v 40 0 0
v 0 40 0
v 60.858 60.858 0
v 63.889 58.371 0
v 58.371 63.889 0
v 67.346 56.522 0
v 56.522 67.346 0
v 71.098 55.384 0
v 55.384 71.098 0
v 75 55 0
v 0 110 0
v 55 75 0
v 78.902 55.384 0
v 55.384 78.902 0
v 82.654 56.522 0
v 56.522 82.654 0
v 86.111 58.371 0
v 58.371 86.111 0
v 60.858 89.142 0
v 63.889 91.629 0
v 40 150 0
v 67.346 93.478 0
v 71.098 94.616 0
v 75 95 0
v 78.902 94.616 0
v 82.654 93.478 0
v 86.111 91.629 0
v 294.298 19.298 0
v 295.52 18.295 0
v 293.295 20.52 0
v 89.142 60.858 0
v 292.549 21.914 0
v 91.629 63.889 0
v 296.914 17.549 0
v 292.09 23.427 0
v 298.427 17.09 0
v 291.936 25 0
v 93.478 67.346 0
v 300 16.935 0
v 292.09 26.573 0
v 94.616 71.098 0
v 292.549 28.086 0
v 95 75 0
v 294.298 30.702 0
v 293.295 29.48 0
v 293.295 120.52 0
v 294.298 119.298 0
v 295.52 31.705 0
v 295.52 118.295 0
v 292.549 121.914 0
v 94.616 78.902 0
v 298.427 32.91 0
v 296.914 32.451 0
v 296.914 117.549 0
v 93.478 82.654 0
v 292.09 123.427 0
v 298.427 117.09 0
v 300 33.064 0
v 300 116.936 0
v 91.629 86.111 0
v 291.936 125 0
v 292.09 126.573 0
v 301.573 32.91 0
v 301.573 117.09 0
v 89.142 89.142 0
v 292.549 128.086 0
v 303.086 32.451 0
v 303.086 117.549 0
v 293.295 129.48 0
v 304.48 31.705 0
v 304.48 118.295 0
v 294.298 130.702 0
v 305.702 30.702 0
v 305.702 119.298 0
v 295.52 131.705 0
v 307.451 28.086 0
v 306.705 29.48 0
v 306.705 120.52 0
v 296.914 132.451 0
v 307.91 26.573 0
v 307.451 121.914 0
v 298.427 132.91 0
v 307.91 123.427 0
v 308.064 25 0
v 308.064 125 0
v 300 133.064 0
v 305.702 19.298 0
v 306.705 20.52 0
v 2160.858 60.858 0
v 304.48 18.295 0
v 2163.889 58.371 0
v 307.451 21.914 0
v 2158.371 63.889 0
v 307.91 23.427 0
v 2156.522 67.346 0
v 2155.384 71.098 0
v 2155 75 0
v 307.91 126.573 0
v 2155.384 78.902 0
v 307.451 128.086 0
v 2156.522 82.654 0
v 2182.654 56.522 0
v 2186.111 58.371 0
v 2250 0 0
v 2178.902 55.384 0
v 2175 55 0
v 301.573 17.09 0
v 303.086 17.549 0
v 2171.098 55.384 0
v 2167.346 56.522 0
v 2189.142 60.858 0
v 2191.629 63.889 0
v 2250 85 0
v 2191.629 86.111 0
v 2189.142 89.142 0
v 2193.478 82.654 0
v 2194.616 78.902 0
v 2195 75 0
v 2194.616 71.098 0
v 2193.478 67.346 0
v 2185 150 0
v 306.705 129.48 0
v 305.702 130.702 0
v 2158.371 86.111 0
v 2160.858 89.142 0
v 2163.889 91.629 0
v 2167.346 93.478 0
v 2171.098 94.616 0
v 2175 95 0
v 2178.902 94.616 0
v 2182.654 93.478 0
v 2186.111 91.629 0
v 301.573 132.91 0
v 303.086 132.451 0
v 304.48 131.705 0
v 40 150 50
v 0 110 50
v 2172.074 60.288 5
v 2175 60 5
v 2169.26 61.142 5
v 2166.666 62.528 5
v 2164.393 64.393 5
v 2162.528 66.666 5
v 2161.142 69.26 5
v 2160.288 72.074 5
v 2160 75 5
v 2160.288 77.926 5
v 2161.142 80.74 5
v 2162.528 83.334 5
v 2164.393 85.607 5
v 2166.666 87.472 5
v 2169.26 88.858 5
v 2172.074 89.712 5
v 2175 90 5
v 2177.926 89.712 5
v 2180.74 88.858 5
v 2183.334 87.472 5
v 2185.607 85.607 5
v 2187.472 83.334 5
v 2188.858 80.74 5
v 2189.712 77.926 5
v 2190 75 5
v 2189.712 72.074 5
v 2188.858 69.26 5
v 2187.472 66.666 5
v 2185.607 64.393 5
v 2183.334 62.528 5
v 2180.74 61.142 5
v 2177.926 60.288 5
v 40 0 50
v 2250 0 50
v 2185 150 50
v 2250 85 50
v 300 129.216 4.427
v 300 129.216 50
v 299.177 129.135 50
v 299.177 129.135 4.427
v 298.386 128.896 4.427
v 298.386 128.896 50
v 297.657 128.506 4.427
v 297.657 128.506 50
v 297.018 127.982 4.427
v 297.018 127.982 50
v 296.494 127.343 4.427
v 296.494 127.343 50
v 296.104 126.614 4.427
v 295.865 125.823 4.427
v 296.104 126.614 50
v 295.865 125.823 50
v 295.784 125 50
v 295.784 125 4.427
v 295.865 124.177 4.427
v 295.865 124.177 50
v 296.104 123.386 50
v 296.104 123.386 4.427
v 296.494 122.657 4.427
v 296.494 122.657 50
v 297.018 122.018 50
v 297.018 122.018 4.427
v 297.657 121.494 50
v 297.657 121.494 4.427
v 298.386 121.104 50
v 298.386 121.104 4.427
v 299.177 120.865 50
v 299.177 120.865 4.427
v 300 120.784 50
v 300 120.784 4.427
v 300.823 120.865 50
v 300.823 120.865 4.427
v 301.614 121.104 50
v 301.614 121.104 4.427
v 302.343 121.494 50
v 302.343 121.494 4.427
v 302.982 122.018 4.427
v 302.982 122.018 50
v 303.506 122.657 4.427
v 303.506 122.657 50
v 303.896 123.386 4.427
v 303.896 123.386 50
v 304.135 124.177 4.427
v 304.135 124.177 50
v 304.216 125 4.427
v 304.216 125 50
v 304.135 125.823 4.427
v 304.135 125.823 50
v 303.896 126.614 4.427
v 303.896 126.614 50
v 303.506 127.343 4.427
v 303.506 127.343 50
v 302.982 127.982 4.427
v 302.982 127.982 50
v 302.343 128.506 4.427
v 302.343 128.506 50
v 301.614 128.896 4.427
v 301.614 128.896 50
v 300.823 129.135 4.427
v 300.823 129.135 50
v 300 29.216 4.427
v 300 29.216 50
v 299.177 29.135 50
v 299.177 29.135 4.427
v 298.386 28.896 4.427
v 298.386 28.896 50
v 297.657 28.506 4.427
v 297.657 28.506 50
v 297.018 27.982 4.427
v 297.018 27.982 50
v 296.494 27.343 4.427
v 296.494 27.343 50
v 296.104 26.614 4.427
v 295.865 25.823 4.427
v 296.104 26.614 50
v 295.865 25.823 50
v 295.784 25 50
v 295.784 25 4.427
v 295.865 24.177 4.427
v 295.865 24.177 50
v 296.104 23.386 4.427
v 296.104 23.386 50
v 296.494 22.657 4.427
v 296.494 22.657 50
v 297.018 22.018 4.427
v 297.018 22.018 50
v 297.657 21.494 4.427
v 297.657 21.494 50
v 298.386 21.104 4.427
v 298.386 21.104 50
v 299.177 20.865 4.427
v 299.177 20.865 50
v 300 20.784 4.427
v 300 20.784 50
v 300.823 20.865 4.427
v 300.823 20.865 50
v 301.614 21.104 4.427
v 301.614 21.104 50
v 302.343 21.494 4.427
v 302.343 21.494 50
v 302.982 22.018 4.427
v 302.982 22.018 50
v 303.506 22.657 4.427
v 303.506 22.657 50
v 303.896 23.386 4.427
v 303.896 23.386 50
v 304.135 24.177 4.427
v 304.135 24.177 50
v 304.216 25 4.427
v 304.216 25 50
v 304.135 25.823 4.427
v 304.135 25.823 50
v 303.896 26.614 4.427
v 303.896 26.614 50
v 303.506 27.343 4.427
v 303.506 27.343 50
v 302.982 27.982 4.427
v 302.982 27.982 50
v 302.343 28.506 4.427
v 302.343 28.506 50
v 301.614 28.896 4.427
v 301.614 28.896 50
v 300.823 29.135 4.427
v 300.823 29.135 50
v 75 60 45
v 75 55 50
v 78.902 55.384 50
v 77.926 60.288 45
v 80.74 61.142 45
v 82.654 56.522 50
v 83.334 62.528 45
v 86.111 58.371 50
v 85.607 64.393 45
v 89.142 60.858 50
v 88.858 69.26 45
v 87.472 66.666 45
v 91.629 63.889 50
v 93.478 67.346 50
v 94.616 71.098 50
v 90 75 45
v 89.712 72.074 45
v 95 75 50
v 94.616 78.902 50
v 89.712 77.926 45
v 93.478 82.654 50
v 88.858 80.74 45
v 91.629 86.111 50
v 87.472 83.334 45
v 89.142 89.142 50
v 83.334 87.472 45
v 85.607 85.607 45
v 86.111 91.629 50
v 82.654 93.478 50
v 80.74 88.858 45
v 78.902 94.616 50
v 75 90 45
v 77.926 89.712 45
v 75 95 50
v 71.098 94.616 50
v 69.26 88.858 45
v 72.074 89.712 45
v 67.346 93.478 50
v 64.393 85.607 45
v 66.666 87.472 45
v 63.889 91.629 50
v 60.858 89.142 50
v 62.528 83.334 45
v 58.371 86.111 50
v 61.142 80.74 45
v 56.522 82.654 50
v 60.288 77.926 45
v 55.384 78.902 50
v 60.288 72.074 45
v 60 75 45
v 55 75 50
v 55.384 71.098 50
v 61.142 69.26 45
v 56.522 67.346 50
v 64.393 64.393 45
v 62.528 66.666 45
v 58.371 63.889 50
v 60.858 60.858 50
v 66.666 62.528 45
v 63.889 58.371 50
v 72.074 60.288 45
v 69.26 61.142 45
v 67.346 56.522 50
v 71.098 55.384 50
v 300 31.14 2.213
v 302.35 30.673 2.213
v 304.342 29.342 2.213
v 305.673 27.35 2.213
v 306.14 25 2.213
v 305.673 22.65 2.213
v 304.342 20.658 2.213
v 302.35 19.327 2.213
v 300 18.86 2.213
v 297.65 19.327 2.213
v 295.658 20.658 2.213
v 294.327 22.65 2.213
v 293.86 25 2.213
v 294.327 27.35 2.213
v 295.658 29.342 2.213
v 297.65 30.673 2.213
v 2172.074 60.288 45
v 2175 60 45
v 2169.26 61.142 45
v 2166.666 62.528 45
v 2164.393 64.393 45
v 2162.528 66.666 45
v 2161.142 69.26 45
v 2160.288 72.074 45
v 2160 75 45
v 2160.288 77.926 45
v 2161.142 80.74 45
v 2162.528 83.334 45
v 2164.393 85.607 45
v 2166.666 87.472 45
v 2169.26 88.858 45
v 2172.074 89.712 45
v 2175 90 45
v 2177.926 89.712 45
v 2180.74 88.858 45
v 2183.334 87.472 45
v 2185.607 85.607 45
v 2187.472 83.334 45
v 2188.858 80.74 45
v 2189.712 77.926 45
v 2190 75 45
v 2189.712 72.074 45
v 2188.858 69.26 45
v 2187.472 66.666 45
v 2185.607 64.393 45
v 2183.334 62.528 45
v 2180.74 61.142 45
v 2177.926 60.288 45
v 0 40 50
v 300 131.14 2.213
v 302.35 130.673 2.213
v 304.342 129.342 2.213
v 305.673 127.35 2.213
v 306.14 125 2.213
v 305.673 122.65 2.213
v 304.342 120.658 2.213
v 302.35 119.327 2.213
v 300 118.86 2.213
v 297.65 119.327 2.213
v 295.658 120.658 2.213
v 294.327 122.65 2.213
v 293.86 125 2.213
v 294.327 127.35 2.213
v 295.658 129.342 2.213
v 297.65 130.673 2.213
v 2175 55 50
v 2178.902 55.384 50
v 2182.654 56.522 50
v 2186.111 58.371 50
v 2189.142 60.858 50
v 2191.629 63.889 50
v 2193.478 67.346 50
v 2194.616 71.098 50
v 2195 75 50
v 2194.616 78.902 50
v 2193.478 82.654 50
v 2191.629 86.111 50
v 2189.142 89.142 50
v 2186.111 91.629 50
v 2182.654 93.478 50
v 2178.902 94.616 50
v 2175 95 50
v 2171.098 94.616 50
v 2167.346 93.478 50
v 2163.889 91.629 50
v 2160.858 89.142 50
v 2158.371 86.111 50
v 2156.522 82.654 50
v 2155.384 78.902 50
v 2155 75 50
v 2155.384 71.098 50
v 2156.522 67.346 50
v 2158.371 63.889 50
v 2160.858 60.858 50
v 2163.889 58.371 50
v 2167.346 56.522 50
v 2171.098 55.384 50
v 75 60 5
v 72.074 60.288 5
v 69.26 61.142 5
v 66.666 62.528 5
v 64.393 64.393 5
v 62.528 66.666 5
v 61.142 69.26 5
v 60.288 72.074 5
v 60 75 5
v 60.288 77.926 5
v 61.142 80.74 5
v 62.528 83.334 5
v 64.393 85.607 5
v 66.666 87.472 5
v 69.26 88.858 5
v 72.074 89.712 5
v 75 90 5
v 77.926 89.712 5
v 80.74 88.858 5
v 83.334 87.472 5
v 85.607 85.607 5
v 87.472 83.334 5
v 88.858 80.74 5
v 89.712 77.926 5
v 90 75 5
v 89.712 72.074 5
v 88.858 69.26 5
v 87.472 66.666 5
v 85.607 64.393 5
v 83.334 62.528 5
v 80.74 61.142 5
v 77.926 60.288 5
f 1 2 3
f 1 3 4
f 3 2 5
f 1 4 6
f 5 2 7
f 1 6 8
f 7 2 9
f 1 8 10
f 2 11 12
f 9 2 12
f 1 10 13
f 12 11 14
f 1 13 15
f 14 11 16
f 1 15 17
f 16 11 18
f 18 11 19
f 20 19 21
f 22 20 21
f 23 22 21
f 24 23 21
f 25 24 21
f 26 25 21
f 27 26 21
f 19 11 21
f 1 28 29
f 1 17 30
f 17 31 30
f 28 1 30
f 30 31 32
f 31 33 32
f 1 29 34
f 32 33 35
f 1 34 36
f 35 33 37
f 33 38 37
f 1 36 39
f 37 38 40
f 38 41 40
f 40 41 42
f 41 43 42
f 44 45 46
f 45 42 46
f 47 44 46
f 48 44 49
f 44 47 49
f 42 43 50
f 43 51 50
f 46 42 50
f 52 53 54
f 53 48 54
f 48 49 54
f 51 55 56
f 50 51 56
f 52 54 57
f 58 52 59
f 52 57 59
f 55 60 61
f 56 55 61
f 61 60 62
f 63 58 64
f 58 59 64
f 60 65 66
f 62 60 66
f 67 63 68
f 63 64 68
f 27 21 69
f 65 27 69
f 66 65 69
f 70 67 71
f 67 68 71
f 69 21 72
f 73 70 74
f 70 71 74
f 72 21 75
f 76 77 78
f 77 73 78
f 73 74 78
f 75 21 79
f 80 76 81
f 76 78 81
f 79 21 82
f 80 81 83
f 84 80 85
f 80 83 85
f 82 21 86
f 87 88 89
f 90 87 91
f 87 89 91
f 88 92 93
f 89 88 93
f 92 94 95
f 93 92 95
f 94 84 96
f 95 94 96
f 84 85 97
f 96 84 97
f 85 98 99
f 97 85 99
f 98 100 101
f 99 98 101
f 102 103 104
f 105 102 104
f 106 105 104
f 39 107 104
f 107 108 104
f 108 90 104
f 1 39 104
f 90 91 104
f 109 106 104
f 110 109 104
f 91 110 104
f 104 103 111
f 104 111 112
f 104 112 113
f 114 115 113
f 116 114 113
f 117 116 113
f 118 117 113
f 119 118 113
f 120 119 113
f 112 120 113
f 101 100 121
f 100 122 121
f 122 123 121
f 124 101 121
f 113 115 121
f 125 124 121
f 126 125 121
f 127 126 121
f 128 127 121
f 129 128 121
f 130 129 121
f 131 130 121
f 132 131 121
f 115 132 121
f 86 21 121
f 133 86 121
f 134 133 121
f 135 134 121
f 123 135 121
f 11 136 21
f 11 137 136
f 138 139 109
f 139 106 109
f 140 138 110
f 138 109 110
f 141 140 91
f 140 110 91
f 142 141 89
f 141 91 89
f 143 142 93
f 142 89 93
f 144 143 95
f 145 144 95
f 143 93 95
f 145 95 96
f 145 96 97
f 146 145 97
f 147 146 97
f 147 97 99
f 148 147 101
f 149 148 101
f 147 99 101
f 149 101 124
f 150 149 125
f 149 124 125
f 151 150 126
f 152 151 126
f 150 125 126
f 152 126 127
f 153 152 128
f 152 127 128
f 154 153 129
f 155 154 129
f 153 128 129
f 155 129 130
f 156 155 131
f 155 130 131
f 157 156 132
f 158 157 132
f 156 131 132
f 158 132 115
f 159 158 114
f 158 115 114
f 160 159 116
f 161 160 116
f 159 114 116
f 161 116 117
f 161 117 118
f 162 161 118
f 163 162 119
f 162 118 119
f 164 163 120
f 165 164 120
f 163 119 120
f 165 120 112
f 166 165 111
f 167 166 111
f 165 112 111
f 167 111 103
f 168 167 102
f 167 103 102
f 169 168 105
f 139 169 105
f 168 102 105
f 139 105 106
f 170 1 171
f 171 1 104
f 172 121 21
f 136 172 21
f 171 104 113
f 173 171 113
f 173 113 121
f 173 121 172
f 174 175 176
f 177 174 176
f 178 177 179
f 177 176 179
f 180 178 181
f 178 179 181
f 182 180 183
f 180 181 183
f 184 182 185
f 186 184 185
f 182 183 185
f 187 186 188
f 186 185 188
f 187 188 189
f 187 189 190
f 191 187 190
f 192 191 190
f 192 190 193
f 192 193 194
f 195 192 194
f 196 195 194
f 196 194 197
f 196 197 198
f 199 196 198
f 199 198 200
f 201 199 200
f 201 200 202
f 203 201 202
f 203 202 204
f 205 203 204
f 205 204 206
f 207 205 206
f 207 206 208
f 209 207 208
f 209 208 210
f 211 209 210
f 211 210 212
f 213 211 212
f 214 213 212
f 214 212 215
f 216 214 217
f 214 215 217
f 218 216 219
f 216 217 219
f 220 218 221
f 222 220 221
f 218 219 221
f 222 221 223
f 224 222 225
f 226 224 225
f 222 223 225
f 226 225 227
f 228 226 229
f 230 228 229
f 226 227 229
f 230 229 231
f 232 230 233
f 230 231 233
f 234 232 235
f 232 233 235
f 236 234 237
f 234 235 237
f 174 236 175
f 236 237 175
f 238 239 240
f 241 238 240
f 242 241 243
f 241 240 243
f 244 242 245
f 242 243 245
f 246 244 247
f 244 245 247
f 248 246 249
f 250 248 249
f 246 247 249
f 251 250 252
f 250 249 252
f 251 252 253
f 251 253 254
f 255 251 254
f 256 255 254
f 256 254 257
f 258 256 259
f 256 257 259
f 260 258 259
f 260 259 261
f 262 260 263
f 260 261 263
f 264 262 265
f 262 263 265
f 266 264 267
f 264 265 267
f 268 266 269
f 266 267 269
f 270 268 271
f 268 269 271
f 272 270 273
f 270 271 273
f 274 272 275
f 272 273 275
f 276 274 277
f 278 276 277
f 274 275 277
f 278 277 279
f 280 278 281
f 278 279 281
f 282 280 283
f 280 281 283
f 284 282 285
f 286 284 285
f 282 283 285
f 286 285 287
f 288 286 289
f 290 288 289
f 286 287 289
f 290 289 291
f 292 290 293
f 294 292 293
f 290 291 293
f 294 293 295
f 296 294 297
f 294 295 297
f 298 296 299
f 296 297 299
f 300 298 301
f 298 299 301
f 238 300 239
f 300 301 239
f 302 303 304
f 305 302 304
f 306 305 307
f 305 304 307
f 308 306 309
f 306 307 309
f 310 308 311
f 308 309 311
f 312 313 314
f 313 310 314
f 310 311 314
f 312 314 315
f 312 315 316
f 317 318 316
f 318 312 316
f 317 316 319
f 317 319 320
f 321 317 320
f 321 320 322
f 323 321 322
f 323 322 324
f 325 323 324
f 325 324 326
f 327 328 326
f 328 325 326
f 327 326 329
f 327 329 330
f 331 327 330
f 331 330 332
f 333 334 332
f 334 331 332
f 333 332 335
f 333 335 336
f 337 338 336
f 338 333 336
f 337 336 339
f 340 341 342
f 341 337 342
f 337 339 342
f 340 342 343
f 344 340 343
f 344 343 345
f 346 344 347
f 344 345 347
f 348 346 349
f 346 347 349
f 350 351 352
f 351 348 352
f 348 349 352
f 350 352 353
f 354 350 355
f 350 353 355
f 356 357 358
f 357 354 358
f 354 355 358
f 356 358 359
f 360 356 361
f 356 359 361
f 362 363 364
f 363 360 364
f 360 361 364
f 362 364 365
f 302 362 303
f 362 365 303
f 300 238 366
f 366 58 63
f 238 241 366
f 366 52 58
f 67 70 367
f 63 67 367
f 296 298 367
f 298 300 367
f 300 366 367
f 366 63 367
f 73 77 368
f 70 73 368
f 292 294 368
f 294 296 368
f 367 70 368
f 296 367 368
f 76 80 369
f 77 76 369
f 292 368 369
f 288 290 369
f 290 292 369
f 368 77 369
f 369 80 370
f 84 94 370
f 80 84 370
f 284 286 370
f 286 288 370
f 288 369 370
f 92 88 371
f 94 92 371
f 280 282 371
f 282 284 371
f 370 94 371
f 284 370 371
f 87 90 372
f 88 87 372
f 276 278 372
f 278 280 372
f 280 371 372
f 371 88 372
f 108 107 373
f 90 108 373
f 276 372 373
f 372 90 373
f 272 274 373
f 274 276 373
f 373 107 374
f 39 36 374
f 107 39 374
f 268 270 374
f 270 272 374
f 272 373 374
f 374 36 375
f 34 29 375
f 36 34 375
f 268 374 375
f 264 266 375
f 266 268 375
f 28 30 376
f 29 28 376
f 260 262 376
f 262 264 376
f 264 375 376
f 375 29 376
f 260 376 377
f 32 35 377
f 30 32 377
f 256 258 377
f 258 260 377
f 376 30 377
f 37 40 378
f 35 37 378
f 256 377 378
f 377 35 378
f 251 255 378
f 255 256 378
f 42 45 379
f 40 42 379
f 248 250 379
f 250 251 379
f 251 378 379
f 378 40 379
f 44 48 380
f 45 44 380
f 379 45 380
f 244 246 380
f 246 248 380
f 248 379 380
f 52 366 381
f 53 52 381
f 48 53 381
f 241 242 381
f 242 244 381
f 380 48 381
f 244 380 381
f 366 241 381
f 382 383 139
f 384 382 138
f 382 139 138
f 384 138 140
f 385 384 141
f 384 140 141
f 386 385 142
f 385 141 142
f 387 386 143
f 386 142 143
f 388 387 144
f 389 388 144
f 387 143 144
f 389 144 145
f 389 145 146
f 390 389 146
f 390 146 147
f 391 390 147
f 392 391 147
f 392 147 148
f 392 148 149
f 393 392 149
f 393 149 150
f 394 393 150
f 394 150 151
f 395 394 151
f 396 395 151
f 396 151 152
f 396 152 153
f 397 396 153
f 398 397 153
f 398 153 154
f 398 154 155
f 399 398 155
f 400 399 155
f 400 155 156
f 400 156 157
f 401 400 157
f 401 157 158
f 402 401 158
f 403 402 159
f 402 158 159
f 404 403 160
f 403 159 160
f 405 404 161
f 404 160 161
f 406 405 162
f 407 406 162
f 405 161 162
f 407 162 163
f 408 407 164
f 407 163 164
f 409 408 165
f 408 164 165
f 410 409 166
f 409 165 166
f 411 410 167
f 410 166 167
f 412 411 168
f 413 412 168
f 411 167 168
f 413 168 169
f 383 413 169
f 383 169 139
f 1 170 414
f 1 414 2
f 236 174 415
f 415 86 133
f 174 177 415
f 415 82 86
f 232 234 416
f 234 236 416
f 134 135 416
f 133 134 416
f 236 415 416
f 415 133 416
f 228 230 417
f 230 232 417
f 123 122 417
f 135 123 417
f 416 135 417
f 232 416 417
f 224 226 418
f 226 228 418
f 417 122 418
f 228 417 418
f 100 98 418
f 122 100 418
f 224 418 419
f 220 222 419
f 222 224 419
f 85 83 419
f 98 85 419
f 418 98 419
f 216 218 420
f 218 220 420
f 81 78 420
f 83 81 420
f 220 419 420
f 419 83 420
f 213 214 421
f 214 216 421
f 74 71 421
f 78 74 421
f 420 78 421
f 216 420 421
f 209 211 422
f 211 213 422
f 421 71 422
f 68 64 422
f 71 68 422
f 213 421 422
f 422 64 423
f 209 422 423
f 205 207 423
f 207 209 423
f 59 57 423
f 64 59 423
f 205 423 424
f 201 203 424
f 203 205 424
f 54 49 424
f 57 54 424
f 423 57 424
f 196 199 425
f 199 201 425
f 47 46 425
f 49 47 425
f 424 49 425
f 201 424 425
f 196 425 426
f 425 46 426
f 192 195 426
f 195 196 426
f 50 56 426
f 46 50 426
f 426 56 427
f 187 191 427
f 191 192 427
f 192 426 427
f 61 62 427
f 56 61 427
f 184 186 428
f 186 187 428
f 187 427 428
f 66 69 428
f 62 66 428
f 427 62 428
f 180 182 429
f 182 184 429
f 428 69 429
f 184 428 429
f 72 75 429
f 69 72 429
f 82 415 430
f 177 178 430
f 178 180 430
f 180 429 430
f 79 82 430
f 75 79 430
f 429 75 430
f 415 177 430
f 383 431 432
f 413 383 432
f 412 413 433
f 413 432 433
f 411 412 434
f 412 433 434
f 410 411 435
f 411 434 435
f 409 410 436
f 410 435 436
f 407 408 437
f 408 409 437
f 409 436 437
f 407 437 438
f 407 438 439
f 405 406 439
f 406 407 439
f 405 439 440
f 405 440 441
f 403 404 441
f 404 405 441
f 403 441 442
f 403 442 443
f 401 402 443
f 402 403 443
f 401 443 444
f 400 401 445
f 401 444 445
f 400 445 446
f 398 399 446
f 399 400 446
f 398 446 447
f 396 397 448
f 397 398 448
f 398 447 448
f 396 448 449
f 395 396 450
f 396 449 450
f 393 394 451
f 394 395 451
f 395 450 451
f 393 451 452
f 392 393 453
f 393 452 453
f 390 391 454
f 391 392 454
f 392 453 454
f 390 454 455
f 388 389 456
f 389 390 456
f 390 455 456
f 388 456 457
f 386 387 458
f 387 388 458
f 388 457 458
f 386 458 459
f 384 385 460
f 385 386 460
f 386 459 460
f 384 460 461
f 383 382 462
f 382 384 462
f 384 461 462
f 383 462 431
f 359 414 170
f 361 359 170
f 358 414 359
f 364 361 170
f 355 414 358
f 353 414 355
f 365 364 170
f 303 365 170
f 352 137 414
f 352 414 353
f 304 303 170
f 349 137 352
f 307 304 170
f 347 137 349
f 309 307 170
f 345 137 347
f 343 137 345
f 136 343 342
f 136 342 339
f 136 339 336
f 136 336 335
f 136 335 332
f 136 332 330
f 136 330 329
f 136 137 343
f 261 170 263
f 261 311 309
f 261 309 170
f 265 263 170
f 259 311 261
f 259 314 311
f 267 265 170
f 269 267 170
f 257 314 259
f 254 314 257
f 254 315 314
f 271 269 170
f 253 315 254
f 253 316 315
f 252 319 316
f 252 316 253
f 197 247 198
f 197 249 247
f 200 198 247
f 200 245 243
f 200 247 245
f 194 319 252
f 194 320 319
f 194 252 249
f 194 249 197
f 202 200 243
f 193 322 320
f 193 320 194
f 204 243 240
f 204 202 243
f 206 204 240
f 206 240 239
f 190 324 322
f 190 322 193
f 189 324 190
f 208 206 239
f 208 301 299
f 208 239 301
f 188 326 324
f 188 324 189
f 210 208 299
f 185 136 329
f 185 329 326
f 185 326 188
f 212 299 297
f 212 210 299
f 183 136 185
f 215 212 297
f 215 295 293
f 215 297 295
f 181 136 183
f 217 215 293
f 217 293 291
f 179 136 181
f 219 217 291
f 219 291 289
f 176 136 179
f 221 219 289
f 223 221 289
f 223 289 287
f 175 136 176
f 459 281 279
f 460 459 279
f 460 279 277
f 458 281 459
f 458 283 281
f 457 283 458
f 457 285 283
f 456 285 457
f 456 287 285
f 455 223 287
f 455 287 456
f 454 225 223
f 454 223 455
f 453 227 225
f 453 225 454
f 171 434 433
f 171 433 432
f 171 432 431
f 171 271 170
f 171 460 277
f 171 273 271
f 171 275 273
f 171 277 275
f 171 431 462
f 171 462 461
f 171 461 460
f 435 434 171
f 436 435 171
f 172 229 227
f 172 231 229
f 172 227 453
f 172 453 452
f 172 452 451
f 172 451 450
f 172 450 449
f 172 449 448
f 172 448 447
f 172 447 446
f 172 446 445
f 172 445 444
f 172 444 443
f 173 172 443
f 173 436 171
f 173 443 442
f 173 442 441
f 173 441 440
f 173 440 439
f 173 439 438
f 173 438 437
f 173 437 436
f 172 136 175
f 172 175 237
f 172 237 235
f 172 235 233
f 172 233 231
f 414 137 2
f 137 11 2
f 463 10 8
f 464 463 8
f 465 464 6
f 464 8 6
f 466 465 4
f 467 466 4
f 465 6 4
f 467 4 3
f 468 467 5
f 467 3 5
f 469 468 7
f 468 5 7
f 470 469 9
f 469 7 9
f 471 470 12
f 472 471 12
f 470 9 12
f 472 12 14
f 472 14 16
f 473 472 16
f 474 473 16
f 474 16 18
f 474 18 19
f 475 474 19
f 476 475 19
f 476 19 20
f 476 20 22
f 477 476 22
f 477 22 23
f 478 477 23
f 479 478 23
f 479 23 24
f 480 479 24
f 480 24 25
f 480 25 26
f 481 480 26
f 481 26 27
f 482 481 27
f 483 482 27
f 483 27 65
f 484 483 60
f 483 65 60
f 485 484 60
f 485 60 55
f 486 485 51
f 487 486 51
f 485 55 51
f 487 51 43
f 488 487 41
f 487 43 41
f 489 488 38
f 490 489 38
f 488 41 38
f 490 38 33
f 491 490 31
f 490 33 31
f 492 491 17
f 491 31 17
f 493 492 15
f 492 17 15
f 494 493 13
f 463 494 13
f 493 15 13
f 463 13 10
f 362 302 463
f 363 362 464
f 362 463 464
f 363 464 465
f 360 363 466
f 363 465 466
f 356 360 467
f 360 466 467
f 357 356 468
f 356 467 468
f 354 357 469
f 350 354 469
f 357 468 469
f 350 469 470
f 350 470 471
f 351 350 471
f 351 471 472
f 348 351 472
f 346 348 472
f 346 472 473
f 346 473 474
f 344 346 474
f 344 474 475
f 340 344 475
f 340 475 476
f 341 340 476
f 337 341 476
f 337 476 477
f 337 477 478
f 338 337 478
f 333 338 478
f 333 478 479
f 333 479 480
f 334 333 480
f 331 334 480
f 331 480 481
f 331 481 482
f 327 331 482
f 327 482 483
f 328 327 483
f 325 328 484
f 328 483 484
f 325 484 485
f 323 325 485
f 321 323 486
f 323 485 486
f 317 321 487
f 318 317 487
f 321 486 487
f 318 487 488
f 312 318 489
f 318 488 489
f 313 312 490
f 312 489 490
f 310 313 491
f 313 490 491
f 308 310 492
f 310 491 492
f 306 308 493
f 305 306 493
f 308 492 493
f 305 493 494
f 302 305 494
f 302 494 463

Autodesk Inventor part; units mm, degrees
ref_plane "YZ Plane" through (0, 0, 0) normal (1, 0, 0) x (0, 1, 0)
ref_plane "XZ Plane" through (0, 0, 0) normal (0, 1, 0) x (-1, 0, 0)
ref_plane "XY Plane" through (0, 0, 0) normal (0, 0, 1) x (1, 0, 0)
sketch "Sketch1" plane through (0, 0, 0) normal (0, 0, 1) x (1, 0, 0)
  line L0 (0, 0) -> (2250, 0)
  line L1 (2250, 0) -> (2250, 150)
  line L2 (2250, 150) -> (0, 150)
  line L3 (0, 150) -> (0, 0)
  dimension "d0" = 150
  dimension "d1" = 2250
extrude "Extrusion1" add sketch "Sketch1" along normal blind 50
sketch "Sketch2" plane through (0, 0, 50) normal (0, 0, 1) x (1, 0, 0)
  line L0 (0, 150) -> (0, 0) projected
  line L1 (2250, 0) -> (2250, 150) projected
  point P0 (75, 75)
  point P1 (2175, 75)
  point P2 (0, 75)
  dimension "d4" = 75
  dimension "d5" = 75
hole "Hole1" at (75, 75, 50) at (2175, 75, 50) direction (0, 0, -1) diameter 30 end through all
chamfer "Chamfer1" distance 5 angle 45 4 edges at (75, 90, 50) (2175, 90, 50) (75, 90, 0) (2175, 90, 0)
chamfer "Chamfer2" distance 65 angle 45 1 edges at (2250, 150, 25) measured on face at (2250, 50, 16.6667)
chamfer "Chamfer3" distance 40 angle 45 2 edges at (0, 150, 25) (0, 0, 25)
sketch "Sketch3" plane through (0, 0, 0) normal (0, 0, -1) x (-1, 0, 0)
  line L0 (-40, 0) -> (-2250, 0) projected
  line L1 (-2185, 150) -> (-40, 150) projected
  line L2 (0, 110) -> (0, 40) projected
  point P0 (0, 0)
  point P1 (-300, 25)
  point P2 (-300, 125)
  dimension "d22" = 25
  dimension "d23" = 25
  dimension "d24" = 300
hole "Hole2" at (300, 25, 0) at (300, 125, 0) direction (0, 0, 1) diameter 8.433 end through all countersink diameter 16.129 countersink angle 82 clearance for "Flat Head Machine Screw (82)" size "5/16" standard "Ansi Unified Screw Threads"
equation "\"d23\" = d22"
properties part number "Top_Rear Plank_LHS" material "Wood (Birch)"
